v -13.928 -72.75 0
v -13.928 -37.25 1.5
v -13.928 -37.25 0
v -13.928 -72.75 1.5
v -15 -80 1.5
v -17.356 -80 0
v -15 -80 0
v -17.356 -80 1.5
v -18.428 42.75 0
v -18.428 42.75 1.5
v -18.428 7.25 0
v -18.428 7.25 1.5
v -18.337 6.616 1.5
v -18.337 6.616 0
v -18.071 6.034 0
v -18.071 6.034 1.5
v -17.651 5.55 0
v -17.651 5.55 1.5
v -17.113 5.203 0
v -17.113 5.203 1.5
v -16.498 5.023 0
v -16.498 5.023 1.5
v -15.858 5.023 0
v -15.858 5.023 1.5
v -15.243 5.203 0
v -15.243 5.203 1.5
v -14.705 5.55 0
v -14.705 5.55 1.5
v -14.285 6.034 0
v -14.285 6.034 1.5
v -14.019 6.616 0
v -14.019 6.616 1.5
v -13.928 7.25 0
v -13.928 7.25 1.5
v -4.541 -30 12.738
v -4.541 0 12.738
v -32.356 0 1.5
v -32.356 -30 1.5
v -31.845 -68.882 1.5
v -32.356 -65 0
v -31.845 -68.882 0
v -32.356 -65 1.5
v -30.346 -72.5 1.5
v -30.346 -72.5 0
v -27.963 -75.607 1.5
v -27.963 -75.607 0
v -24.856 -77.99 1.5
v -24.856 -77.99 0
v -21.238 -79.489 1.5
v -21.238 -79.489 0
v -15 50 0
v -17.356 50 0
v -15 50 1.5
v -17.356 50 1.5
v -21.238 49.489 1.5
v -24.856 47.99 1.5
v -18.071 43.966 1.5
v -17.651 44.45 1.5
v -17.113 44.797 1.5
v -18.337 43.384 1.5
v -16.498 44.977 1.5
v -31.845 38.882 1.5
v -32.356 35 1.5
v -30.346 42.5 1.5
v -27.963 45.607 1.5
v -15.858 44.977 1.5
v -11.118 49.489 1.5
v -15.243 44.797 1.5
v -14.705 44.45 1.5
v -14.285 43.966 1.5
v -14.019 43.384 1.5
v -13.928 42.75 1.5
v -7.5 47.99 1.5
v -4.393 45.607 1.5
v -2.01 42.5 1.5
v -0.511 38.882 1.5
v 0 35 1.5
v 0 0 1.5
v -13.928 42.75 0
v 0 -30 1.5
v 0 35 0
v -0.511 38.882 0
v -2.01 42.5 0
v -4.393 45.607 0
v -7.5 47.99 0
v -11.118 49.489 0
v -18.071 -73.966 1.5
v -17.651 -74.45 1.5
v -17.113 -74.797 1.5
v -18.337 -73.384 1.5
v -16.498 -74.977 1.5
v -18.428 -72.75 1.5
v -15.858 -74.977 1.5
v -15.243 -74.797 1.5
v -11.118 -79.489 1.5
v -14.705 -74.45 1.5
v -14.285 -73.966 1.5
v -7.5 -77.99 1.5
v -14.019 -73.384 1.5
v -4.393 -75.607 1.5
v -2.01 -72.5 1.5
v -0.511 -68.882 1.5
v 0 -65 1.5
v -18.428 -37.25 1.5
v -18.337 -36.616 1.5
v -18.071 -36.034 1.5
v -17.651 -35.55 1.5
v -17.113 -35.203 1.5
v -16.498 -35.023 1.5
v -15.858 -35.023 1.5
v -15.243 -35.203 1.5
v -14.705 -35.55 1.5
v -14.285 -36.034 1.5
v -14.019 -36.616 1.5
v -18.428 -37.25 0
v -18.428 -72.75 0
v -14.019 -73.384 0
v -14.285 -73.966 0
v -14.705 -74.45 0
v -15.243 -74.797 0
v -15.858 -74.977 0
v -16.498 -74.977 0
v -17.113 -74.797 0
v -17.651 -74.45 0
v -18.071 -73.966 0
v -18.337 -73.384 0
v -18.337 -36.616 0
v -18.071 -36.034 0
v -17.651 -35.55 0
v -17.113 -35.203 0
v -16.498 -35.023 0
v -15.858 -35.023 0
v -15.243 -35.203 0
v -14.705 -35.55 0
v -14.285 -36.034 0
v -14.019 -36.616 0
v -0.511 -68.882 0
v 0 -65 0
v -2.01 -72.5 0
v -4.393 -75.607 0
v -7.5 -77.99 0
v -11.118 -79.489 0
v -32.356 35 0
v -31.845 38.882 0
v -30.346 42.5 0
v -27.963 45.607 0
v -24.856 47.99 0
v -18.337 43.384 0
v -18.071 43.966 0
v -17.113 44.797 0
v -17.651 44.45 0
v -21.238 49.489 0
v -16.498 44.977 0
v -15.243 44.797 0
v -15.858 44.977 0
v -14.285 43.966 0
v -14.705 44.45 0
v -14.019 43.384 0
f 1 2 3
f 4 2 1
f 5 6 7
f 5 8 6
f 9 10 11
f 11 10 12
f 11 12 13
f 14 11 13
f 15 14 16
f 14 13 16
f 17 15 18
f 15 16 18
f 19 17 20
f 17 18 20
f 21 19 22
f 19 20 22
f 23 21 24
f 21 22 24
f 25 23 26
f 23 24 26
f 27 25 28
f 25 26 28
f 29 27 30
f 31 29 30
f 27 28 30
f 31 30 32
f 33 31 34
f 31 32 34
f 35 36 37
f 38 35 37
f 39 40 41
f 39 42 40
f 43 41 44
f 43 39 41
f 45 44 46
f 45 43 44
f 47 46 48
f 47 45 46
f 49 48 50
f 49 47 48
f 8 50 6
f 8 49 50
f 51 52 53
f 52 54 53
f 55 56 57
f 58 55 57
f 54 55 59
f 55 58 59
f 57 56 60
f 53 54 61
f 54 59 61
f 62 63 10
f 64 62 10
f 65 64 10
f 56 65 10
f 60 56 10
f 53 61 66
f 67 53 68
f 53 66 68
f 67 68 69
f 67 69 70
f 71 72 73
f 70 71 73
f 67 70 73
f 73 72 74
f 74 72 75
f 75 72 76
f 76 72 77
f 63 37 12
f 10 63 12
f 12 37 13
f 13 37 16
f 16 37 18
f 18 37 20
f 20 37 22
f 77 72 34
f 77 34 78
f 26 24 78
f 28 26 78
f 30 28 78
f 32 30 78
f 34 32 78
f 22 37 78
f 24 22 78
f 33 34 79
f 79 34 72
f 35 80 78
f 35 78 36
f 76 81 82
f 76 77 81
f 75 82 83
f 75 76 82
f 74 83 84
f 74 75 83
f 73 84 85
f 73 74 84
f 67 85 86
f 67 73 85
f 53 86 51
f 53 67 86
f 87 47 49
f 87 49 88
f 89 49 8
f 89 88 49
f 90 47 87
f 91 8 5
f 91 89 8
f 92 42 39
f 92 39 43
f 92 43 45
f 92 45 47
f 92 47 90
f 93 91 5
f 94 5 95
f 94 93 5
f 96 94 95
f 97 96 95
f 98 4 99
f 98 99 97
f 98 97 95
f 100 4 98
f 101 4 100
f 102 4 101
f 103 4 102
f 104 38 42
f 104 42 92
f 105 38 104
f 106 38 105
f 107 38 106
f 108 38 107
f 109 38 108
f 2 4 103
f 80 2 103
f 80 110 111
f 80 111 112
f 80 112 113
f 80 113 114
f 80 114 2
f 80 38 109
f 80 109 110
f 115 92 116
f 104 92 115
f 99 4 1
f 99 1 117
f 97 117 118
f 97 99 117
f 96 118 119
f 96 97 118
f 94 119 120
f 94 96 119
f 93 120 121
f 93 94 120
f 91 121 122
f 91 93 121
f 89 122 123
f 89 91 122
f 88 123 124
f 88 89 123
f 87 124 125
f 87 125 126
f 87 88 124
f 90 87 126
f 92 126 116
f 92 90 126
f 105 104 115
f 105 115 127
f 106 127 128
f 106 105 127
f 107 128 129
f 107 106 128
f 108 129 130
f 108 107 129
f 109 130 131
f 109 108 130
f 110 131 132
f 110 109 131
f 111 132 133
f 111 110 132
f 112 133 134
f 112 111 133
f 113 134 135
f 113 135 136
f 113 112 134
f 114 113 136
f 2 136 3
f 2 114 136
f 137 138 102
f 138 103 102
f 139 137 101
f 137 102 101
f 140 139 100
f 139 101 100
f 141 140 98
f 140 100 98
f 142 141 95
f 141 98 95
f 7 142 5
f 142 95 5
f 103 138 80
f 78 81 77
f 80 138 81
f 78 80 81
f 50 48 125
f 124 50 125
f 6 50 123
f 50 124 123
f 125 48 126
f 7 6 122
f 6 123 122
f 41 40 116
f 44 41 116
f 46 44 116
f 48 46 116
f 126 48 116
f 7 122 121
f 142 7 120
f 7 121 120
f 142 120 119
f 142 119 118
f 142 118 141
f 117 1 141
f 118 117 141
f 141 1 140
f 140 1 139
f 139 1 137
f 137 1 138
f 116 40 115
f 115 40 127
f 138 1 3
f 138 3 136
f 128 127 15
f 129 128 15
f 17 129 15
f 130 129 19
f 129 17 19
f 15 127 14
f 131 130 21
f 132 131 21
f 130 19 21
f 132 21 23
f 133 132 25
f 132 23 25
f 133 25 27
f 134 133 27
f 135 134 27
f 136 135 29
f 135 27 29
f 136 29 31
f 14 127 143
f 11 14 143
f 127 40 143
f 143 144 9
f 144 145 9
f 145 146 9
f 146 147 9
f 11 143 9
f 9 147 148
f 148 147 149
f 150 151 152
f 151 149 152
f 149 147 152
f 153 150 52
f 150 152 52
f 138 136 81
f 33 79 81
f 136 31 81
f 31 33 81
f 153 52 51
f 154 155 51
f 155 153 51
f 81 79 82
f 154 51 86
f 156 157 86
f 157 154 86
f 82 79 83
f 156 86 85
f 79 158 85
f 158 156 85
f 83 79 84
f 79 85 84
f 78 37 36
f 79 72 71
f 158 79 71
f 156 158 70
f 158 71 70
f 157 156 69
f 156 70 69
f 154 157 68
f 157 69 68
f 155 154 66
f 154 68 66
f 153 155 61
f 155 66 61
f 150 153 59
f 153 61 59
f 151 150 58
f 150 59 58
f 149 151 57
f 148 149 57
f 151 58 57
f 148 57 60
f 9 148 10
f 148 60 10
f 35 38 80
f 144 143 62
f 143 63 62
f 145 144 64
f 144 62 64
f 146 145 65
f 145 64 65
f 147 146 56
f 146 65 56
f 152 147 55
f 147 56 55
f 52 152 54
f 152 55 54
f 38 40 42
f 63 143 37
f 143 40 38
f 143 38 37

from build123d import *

# Parameters (mm, degrees)
F0_W     = 32.356042
F0_H     = 1.5
F1_DEPTH = 15
F2_DEPTH = 50
F3_R     = 15
F5_DEPTH = 1.5


with BuildPart() as f1:
    # F0 (on Front) → F1 (new body)
    with BuildSketch(Plane.XZ):
        with Locations((-16.178021, 0.75)):
            Rectangle(F0_W, F0_H)
        Polygon((-32.356042, 1.5), (0, 1.5), (-4.540527, 12.738198), align=None)
    extrude(amount=F1_DEPTH)

    # F0 (on Front) → F2 (join)
    with BuildSketch(Plane.XZ):
        with Locations((-16.178021, 0.75)):
            Rectangle(F0_W, F0_H)
    extrude(amount=-F2_DEPTH)

    # F3
    f3_edges = [f1.edges().sort_by_distance(p)[0] for p in [
        (0, 50, 0.75),
        (-32.356042, 50, 0.75),
    ]]
    fillet(f3_edges, radius=F3_R)

    # F4 (on face) → F5 (cut, through all)
    with BuildSketch(Plane.XY.offset(1.5)):
        with BuildLine():
            ThreePointArc((-13.928021, 42.75), (-16.178021, 45), (-18.428021, 42.75))
            Line((-18.428021, 42.75), (-18.428021, 7.25))
            ThreePointArc((-18.428021, 7.25), (-16.178021, 5), (-13.928021, 7.25))
            Line((-13.928021, 7.25), (-13.928021, 42.75))
        make_face()
    extrude(amount=-F5_DEPTH, mode=Mode.SUBTRACT)

    # F6: F1 across face


with BuildPart() as f1_1:
    add(f1.part)
    add(f1.part.mirror(Plane(origin=(-13.1162, -15, 4.298741), x_dir=(1, 0, 0), z_dir=(0, -1, 0))))


solid = f1_1.part
